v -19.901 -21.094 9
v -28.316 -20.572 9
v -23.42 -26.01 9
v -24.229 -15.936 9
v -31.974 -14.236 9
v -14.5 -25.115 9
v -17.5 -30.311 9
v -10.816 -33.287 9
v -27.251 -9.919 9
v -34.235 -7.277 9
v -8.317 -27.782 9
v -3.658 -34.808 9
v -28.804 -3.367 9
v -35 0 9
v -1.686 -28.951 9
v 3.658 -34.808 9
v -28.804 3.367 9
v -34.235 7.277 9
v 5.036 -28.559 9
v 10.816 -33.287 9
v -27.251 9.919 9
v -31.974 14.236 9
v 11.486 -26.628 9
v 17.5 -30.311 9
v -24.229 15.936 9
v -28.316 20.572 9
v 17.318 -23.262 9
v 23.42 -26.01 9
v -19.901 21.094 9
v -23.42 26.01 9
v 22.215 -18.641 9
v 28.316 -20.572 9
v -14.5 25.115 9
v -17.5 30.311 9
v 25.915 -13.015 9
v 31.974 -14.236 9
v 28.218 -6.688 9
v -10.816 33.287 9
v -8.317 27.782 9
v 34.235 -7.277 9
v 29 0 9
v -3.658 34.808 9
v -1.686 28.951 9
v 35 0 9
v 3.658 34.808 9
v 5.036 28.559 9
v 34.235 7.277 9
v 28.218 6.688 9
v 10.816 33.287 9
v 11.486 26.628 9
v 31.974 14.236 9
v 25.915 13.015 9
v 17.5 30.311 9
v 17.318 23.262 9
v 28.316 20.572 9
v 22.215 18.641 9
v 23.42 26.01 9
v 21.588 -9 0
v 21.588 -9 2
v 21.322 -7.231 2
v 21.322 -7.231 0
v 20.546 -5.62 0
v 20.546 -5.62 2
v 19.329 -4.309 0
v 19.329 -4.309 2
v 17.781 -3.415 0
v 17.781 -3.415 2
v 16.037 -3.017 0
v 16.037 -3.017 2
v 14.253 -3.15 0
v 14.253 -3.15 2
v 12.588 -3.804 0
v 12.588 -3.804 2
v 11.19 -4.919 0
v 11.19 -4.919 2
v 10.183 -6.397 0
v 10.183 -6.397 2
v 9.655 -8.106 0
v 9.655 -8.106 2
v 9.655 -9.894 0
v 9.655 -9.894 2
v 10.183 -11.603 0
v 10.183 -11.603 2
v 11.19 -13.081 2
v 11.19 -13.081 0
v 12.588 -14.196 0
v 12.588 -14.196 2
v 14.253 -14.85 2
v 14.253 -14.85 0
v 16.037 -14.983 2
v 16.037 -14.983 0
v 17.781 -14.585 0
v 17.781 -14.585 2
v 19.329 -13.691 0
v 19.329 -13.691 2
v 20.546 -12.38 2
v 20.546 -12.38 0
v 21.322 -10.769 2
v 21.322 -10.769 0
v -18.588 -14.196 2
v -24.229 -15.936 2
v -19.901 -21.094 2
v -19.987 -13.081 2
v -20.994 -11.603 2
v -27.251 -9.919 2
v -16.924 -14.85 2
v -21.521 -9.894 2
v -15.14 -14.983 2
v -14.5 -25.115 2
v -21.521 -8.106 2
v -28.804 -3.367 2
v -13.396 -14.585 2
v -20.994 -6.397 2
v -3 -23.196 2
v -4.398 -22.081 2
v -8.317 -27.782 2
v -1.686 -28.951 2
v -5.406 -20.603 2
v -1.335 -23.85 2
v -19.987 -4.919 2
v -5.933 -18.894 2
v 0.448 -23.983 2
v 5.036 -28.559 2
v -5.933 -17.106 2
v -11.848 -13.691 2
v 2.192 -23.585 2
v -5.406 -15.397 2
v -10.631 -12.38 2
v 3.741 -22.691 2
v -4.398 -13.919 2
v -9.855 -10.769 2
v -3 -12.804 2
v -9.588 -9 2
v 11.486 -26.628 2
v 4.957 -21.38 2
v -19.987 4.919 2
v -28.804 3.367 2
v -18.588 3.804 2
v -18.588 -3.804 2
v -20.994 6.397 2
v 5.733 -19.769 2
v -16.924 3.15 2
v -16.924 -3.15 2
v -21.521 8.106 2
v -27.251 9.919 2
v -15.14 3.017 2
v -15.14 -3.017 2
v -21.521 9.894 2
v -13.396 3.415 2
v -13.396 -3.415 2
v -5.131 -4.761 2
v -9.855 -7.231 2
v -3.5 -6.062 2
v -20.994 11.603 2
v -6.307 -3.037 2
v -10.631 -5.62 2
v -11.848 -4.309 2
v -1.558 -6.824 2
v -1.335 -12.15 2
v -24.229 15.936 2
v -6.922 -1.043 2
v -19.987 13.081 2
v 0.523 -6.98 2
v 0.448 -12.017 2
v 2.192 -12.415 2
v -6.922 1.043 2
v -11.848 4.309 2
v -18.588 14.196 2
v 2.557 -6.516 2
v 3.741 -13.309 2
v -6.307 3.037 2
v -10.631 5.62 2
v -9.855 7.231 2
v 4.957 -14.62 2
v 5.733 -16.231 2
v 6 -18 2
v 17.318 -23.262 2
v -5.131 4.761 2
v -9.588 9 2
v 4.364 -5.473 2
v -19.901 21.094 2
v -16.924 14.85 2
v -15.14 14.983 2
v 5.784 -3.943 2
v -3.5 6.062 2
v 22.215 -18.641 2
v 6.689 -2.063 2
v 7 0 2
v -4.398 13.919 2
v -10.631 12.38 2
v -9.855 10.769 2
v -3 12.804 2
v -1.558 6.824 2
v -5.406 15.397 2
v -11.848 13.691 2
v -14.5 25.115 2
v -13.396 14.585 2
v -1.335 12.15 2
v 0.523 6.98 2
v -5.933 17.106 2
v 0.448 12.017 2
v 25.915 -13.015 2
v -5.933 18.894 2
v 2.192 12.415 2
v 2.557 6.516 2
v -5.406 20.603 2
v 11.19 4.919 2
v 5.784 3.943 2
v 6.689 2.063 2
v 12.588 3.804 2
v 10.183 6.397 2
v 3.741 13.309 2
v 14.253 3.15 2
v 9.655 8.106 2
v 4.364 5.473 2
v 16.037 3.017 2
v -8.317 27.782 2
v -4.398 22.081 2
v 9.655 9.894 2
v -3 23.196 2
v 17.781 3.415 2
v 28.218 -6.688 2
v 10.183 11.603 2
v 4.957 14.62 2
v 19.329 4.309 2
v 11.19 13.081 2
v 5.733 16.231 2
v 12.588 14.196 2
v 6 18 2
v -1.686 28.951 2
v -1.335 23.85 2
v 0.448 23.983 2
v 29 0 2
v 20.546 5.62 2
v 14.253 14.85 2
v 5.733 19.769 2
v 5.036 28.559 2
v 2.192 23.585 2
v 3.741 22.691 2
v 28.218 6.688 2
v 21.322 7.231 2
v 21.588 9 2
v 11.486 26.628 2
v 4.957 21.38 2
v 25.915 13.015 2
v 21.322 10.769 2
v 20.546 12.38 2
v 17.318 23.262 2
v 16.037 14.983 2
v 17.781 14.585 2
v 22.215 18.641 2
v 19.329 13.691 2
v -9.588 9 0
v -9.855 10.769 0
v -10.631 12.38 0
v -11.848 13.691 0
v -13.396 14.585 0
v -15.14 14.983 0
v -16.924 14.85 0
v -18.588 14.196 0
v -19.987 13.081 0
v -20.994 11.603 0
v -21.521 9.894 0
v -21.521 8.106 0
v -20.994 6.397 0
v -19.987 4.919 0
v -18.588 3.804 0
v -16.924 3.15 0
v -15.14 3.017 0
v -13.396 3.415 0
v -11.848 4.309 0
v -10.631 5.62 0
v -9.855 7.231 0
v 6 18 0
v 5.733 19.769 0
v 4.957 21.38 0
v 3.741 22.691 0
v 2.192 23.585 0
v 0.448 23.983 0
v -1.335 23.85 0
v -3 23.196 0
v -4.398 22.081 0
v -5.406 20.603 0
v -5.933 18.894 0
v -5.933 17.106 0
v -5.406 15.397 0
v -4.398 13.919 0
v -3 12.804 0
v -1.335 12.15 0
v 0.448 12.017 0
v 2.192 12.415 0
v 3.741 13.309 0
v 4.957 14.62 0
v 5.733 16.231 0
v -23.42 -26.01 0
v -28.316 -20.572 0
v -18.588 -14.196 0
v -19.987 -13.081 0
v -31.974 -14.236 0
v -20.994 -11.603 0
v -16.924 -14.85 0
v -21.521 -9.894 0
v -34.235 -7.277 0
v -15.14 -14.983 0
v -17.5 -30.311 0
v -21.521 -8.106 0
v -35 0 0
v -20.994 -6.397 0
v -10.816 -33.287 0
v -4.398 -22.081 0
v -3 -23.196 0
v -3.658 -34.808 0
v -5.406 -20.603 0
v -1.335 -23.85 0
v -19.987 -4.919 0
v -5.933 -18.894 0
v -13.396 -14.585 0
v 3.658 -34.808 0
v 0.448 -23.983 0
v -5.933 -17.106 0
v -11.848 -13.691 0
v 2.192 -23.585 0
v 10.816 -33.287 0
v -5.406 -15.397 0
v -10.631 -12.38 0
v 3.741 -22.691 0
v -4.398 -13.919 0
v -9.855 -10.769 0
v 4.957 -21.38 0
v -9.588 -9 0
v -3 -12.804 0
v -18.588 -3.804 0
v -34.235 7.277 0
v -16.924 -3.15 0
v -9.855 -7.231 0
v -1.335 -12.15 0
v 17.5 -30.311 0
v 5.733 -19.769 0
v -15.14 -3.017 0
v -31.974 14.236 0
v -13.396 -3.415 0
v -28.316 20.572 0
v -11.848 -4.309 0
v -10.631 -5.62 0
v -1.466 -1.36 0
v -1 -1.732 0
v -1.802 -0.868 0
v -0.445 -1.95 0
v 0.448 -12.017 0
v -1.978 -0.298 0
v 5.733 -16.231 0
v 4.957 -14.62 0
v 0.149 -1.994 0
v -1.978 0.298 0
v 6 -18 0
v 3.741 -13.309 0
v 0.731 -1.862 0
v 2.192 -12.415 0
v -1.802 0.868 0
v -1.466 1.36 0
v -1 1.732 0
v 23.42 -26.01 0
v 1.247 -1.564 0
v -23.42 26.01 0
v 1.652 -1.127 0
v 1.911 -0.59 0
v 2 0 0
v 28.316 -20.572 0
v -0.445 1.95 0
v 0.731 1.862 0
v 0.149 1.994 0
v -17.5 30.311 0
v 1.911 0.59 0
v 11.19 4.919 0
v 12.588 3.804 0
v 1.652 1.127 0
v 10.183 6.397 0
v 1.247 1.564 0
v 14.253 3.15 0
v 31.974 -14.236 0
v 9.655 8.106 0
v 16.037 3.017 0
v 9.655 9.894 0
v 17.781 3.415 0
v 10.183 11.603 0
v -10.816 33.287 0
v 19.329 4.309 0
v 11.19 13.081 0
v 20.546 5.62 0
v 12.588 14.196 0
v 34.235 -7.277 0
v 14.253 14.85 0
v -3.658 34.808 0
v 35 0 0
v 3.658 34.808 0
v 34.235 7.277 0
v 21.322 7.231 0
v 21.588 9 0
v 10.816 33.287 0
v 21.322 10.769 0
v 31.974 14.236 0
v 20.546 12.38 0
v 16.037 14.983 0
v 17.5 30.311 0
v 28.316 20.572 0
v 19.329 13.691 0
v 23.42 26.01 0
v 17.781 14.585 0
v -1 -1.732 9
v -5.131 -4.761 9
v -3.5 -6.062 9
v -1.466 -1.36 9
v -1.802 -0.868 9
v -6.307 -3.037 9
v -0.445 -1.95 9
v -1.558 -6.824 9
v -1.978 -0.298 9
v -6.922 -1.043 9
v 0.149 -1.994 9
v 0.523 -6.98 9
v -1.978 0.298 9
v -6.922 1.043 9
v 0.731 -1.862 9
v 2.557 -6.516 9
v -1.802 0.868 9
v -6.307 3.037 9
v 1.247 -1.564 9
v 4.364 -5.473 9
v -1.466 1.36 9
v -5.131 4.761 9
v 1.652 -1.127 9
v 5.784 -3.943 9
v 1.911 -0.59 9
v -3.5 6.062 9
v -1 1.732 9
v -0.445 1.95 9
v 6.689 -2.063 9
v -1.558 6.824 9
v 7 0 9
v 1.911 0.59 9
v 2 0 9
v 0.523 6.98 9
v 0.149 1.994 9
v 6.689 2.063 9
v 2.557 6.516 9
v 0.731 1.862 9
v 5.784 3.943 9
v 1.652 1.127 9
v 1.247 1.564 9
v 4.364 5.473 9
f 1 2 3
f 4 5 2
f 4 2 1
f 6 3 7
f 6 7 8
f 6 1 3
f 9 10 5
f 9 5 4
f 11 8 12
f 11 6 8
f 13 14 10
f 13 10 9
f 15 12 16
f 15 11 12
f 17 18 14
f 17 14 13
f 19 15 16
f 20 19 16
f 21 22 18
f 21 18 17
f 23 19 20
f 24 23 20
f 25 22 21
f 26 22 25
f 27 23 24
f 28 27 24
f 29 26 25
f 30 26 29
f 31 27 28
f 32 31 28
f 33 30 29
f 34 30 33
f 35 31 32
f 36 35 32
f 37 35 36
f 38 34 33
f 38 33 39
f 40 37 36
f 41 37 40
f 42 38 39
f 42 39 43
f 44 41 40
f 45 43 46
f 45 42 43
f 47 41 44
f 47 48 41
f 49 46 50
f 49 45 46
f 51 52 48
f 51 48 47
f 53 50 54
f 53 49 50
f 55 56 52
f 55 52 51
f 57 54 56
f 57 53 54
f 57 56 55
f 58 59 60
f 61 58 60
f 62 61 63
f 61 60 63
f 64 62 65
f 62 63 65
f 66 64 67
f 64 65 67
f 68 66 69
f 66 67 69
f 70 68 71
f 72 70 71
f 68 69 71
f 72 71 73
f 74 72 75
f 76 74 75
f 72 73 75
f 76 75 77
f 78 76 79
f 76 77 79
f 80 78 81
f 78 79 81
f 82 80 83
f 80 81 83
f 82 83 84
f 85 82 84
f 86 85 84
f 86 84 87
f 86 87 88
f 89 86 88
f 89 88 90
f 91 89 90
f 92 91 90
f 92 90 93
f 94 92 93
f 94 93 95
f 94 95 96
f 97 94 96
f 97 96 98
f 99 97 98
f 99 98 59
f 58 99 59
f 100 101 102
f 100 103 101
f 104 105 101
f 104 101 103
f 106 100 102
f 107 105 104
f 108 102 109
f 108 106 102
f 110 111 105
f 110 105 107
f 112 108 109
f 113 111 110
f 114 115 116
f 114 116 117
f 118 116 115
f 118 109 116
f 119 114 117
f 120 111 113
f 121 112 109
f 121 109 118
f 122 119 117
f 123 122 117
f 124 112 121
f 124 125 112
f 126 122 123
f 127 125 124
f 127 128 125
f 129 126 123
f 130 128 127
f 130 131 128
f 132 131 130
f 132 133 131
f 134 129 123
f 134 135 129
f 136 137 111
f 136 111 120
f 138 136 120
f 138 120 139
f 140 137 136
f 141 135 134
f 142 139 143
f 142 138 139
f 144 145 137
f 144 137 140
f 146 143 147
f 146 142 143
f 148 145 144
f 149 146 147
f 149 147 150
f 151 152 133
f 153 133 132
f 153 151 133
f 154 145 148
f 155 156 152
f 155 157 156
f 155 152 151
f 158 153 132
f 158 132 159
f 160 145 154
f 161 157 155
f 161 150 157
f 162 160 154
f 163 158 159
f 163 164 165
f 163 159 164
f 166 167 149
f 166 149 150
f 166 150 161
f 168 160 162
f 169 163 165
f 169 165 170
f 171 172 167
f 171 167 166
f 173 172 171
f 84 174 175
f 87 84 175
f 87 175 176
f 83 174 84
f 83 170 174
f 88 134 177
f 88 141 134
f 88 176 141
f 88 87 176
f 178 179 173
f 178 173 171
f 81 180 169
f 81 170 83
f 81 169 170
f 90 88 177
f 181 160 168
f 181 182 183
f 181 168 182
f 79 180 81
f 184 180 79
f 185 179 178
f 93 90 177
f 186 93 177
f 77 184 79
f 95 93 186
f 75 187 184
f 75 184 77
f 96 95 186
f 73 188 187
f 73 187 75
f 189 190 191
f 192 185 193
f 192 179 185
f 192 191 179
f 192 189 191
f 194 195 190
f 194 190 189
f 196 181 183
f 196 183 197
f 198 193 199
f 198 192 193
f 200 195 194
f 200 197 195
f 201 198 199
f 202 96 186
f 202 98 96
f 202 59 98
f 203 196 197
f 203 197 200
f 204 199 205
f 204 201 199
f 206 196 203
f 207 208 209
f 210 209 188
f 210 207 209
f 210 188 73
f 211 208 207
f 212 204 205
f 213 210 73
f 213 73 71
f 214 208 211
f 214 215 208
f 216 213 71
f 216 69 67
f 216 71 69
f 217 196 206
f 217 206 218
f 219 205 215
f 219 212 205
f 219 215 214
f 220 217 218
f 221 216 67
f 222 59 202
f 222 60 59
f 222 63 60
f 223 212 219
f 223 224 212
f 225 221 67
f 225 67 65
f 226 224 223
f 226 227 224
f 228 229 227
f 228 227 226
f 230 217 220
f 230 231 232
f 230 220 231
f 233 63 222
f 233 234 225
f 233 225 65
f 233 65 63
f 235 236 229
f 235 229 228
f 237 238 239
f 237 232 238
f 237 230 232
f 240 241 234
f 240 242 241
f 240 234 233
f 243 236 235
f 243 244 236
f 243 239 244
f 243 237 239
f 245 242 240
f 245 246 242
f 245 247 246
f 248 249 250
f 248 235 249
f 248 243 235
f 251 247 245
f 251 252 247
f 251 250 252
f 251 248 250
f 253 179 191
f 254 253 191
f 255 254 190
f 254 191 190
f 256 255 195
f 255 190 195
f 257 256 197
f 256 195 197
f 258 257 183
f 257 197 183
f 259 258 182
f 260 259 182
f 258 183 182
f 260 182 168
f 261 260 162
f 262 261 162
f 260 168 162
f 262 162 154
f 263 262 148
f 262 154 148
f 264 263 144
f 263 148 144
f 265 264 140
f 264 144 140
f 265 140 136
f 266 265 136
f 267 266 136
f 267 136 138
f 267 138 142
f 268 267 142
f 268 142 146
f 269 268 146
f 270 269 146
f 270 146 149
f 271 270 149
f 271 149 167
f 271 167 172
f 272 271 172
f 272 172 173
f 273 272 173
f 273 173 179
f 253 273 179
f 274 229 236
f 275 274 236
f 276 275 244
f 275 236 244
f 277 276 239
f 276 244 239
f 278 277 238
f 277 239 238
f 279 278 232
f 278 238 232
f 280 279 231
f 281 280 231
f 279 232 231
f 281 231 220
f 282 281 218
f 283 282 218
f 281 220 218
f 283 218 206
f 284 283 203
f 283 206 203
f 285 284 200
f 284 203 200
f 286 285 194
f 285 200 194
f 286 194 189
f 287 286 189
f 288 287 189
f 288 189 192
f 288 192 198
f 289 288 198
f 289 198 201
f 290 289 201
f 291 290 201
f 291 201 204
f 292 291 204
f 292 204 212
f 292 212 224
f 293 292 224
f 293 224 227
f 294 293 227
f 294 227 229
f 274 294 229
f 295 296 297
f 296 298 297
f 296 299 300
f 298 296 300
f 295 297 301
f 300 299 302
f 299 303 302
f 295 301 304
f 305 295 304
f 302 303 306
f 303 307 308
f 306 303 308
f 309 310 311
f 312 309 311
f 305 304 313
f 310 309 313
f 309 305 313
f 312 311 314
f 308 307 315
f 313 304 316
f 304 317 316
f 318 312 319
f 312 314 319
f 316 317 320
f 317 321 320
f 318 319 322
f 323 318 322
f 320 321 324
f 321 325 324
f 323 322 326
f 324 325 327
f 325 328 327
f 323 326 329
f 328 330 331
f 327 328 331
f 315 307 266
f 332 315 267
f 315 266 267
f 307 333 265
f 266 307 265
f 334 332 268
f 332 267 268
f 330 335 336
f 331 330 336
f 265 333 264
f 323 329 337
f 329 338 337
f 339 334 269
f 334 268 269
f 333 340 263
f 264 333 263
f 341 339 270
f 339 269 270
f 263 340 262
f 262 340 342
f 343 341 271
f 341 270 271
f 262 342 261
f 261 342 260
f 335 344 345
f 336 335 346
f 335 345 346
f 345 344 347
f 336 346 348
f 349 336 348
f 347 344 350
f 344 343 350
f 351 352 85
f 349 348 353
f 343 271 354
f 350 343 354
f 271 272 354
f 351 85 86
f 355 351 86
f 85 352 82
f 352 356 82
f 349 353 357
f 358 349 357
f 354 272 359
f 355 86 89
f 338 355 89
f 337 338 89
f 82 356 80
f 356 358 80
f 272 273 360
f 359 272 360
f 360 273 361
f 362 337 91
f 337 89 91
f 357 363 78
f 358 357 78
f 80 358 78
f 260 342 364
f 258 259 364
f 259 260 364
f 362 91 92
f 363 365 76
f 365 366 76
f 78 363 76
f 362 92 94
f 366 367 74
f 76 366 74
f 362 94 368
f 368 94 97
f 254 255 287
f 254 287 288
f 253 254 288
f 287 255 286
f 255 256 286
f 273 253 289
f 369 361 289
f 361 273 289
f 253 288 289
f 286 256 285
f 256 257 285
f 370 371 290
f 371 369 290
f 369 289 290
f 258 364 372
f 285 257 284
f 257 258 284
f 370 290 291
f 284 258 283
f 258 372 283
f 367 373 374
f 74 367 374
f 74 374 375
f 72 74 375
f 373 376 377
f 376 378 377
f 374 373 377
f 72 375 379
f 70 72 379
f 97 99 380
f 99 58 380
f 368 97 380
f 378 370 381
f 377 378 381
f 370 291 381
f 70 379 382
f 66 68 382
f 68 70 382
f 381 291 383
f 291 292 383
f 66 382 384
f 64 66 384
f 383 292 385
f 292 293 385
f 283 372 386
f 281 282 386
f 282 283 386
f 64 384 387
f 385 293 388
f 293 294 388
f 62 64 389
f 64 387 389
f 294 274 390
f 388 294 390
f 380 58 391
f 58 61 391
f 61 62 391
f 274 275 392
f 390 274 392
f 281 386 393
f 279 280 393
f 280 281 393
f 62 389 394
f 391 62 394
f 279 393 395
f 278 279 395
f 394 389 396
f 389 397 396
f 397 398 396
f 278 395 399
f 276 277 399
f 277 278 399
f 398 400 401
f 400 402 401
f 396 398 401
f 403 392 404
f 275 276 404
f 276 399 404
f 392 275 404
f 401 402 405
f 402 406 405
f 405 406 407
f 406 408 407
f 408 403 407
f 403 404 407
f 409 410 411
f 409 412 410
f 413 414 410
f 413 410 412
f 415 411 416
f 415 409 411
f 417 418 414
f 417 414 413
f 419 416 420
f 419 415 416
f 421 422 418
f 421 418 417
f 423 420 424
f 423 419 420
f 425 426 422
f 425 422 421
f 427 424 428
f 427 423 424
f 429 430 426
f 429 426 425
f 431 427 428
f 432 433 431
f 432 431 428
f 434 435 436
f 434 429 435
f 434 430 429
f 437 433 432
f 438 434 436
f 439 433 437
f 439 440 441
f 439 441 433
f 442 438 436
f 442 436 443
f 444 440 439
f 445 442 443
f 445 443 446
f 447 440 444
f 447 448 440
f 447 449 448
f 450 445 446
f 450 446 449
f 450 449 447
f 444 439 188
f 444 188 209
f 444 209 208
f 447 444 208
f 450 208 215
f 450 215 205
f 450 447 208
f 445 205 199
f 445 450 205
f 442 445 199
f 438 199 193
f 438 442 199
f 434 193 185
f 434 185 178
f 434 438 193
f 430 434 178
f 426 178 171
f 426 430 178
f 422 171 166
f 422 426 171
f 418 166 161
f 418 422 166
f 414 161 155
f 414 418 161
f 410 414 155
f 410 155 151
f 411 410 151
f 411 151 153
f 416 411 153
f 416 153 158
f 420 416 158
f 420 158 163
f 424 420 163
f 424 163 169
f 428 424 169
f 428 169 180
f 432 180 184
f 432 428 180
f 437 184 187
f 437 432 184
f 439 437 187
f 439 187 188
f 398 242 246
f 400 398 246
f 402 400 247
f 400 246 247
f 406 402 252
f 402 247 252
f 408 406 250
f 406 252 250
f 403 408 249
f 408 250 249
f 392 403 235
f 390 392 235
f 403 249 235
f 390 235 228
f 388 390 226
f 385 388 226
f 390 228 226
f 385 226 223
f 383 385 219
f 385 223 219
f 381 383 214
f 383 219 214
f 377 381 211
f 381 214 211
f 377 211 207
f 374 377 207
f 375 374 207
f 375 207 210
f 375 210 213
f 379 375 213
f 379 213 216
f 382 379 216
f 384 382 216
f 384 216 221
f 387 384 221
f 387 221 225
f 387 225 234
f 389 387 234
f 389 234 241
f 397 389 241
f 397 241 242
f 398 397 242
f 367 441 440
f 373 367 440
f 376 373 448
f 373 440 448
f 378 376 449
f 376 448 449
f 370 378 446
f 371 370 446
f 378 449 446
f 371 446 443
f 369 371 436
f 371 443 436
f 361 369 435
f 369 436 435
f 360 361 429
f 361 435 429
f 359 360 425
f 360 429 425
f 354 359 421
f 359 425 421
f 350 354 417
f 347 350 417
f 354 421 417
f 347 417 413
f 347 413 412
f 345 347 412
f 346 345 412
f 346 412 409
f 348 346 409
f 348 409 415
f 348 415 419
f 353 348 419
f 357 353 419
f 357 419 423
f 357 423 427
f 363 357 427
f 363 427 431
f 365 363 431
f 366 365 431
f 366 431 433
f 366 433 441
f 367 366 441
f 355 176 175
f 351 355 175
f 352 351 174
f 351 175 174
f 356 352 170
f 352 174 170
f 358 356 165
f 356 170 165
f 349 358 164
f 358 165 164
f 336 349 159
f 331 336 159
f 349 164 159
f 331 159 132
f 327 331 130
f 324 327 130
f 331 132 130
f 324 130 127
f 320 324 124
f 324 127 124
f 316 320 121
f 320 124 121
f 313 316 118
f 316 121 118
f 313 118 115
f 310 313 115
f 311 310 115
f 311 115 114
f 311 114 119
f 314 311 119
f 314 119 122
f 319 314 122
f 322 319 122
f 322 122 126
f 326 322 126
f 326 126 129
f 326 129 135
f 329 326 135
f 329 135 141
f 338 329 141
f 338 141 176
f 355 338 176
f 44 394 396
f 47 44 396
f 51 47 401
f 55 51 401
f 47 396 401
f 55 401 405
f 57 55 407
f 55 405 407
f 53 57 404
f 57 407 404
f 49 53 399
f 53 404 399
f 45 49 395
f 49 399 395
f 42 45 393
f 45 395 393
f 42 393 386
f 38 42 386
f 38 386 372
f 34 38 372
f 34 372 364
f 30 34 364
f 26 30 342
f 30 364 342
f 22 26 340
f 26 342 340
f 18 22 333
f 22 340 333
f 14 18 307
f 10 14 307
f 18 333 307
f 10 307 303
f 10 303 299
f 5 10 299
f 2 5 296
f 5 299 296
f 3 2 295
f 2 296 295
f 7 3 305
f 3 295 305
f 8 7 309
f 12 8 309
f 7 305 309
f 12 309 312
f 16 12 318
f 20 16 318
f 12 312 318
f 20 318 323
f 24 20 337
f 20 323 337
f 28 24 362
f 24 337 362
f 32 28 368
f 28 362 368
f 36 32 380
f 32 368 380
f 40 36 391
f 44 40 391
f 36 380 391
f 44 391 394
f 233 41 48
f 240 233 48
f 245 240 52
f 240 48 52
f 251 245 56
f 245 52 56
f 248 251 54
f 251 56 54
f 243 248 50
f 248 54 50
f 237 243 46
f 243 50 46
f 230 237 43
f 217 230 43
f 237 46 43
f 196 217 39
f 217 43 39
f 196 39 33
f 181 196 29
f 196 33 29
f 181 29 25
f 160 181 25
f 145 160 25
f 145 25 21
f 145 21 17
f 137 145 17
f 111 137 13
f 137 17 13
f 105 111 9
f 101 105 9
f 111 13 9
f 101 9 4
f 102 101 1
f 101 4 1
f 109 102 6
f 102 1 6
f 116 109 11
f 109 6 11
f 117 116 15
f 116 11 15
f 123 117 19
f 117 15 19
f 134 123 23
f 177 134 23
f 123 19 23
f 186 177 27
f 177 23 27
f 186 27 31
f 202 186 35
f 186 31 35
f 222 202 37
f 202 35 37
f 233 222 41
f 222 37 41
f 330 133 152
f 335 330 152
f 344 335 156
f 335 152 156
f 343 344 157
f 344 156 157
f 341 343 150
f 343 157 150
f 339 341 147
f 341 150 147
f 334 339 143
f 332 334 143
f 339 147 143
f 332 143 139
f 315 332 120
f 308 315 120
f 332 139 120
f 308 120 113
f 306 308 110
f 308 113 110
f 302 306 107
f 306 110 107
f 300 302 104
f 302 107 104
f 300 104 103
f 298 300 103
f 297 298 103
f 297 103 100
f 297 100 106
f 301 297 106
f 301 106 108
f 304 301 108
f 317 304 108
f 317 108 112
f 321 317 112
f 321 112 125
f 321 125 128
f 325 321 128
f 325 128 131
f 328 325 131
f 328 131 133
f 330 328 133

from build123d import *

# Parameters (mm, degrees)
SKETCH1_R               = 35
BOSS_EXTRUDE1_DEPTH     = 9
SKETCH2_R               = 2
CUT_EXTRUDE1_DEPTH      = 1
CUT_EXTRUDE1_DEPTH_BACK = 10
SKETCH3_R               = 29
SKETCH3_R_2             = 7
CUT_EXTRUDE2_DEPTH      = 7
SKETCH4_R               = 6
CUT_EXTRUDE3_DEPTH      = 3


with BuildPart() as part:
    # Sketch1 → Boss-Extrude1 (new body)
    with BuildSketch(Plane.XY):
        Circle(SKETCH1_R)
    extrude(amount=BOSS_EXTRUDE1_DEPTH)

    # Sketch2 → Cut-Extrude1 (cut, two sides)
    with BuildSketch(Plane.XY.offset(9)) as cut_extrude1_sk:
        Circle(SKETCH2_R)
    extrude(amount=CUT_EXTRUDE1_DEPTH, mode=Mode.SUBTRACT)
    extrude(cut_extrude1_sk.sketch, amount=-CUT_EXTRUDE1_DEPTH_BACK, mode=Mode.SUBTRACT)

    # Sketch3 → Cut-Extrude2 (cut)
    with BuildSketch(Plane.XY.offset(9)):
        Circle(SKETCH3_R)
        Circle(SKETCH3_R_2, mode=Mode.SUBTRACT)
    extrude(amount=-CUT_EXTRUDE2_DEPTH, mode=Mode.SUBTRACT)

    # Sketch4 → Cut-Extrude3 (cut, through all)
    with BuildSketch(Plane.XY.offset(2)):
        with Locations((0, 18)):
            Circle(SKETCH4_R)
        with Locations((15.588457268, 9)):
            Circle(SKETCH4_R)
        with Locations((15.588457268, -9)):
            Circle(SKETCH4_R)
        with Locations((0, -18)):
            Circle(SKETCH4_R)
        with Locations((-15.588457268, -9)):
            Circle(SKETCH4_R)
        with Locations((-15.588457268, 9)):
            Circle(SKETCH4_R)
    extrude(amount=-CUT_EXTRUDE3_DEPTH, mode=Mode.SUBTRACT)


solid = part.part
